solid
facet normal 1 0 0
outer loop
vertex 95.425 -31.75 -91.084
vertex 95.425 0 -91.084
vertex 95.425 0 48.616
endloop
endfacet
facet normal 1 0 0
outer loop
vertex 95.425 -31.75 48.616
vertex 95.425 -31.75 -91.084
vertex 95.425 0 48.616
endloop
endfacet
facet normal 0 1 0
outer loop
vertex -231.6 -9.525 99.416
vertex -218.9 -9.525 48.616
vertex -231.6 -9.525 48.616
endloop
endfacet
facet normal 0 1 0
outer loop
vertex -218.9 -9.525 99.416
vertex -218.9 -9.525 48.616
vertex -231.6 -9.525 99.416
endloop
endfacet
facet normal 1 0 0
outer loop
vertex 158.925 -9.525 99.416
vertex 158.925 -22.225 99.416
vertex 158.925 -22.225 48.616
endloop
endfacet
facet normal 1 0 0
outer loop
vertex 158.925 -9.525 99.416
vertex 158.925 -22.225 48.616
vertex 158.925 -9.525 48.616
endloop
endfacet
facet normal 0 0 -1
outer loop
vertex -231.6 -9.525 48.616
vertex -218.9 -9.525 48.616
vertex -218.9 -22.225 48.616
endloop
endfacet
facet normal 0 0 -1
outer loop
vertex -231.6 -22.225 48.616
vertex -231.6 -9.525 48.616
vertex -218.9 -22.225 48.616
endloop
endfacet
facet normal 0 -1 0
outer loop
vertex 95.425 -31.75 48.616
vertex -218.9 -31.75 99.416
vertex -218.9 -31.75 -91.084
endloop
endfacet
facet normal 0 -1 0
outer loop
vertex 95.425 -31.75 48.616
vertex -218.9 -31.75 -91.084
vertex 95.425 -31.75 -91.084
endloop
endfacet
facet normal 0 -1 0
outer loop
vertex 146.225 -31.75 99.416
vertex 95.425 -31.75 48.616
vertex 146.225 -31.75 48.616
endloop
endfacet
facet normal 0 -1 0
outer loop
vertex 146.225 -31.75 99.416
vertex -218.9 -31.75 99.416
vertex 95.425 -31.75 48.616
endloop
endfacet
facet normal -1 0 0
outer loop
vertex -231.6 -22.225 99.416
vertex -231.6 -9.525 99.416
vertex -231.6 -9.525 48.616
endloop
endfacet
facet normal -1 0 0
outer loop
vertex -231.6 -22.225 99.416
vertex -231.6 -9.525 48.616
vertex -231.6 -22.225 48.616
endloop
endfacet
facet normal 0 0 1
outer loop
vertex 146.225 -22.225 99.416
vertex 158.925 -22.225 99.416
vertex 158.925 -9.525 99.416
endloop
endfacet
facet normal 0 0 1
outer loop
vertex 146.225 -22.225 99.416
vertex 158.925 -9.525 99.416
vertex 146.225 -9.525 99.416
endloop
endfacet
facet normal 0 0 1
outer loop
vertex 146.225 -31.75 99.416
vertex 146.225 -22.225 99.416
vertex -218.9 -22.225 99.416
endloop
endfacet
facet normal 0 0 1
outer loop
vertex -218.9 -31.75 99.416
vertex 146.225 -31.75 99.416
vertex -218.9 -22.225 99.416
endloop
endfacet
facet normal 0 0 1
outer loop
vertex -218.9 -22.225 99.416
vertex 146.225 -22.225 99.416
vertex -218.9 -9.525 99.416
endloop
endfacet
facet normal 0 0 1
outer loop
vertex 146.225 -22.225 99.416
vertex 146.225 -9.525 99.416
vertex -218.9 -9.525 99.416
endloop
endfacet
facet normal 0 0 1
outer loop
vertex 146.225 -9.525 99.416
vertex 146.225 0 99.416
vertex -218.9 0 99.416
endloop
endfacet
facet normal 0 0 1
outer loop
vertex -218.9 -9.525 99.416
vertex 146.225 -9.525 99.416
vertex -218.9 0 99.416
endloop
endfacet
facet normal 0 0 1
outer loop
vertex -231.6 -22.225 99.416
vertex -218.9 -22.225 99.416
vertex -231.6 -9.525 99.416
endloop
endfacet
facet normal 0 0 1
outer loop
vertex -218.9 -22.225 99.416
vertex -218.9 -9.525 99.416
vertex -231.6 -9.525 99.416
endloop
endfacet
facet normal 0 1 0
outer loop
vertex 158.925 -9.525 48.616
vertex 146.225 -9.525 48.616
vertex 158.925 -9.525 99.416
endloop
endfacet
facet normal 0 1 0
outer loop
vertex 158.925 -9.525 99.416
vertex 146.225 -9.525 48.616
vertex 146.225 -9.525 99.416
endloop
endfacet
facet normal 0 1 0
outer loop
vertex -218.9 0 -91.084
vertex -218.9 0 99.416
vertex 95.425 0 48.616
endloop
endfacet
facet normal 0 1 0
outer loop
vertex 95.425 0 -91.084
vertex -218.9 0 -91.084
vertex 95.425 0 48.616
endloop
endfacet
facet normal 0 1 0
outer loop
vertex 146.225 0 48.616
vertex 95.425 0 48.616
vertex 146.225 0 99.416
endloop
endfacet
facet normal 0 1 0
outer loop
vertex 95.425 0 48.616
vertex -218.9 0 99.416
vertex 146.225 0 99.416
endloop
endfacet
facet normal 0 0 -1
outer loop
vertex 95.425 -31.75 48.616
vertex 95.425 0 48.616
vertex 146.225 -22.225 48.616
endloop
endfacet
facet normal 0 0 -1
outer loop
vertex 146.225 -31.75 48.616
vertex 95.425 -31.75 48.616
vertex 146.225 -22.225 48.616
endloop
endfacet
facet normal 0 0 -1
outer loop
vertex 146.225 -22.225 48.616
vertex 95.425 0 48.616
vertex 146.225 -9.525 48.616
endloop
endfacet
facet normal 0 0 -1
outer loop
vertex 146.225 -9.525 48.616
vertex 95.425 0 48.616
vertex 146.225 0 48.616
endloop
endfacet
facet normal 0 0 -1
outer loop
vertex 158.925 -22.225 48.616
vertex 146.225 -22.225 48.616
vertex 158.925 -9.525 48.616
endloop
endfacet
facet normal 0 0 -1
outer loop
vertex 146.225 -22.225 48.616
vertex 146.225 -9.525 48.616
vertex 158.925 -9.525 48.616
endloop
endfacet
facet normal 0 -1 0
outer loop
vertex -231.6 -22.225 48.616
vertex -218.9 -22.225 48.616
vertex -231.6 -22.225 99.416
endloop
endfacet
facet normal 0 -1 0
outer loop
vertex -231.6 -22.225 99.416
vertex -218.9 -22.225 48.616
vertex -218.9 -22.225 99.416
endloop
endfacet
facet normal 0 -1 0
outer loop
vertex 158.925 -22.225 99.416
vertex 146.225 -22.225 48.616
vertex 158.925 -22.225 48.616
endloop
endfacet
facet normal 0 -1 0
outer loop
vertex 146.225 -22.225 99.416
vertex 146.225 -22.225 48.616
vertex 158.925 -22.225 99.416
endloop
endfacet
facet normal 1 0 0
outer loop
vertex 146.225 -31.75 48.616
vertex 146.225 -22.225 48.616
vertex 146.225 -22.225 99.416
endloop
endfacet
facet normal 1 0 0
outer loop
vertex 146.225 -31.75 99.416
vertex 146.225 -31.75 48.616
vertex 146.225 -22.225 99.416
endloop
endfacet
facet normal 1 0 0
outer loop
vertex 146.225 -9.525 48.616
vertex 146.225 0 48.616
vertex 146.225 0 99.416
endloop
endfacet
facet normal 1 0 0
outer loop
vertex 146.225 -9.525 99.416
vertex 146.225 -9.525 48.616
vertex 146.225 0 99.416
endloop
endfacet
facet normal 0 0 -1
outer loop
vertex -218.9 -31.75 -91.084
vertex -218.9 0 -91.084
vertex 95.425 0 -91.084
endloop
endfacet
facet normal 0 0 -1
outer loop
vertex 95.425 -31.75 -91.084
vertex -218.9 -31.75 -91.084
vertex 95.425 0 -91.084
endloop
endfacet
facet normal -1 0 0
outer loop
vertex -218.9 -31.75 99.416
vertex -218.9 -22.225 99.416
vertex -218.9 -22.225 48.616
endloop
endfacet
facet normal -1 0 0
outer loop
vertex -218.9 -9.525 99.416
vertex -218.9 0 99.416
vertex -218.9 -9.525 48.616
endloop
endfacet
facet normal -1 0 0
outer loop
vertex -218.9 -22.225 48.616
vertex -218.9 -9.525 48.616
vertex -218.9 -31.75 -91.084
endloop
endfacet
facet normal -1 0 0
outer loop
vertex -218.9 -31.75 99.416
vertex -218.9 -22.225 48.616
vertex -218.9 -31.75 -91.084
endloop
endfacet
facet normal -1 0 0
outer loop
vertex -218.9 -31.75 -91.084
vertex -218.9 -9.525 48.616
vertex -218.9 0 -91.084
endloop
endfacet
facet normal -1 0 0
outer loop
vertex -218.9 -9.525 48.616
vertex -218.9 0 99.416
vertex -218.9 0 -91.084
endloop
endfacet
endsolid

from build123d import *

# Parameters (mm, degrees)
F1_DEPTH = 31.75
F2_W     = 12.7
F2_H     = 50.8
F3_DEPTH = 12.7
F4_W     = 12.7
F4_H     = 50.8
F5_DEPTH = 12.7


with BuildPart() as f1:
    # F0 (on Front) → F1 (new body)
    with BuildSketch(Plane.XZ):
        Polygon((146.225058, 99.415574), (-218.899942, 99.415574), (-218.899942, -91.084426), (95.425058, -91.084426), (95.425058, 48.615574), (146.225058, 48.615574), align=None)
    extrude(amount=F1_DEPTH)

    # F2 (on face) → F3 (join)
    with BuildSketch(Plane.YZ.offset(146.225058)):
        with Locations((-15.875, 74.015574)):
            Rectangle(F2_W, F2_H)
    extrude(amount=F3_DEPTH)

    # F4 (on face) → F5 (join)
    with BuildSketch(Plane(origin=(-218.899942, 0, 0), x_dir=(0, -1, 0), z_dir=(-1, 0, 0))):
        with Locations((15.875, 74.015574)):
            Rectangle(F4_W, F4_H)
    extrude(amount=F5_DEPTH)


solid = f1.part
